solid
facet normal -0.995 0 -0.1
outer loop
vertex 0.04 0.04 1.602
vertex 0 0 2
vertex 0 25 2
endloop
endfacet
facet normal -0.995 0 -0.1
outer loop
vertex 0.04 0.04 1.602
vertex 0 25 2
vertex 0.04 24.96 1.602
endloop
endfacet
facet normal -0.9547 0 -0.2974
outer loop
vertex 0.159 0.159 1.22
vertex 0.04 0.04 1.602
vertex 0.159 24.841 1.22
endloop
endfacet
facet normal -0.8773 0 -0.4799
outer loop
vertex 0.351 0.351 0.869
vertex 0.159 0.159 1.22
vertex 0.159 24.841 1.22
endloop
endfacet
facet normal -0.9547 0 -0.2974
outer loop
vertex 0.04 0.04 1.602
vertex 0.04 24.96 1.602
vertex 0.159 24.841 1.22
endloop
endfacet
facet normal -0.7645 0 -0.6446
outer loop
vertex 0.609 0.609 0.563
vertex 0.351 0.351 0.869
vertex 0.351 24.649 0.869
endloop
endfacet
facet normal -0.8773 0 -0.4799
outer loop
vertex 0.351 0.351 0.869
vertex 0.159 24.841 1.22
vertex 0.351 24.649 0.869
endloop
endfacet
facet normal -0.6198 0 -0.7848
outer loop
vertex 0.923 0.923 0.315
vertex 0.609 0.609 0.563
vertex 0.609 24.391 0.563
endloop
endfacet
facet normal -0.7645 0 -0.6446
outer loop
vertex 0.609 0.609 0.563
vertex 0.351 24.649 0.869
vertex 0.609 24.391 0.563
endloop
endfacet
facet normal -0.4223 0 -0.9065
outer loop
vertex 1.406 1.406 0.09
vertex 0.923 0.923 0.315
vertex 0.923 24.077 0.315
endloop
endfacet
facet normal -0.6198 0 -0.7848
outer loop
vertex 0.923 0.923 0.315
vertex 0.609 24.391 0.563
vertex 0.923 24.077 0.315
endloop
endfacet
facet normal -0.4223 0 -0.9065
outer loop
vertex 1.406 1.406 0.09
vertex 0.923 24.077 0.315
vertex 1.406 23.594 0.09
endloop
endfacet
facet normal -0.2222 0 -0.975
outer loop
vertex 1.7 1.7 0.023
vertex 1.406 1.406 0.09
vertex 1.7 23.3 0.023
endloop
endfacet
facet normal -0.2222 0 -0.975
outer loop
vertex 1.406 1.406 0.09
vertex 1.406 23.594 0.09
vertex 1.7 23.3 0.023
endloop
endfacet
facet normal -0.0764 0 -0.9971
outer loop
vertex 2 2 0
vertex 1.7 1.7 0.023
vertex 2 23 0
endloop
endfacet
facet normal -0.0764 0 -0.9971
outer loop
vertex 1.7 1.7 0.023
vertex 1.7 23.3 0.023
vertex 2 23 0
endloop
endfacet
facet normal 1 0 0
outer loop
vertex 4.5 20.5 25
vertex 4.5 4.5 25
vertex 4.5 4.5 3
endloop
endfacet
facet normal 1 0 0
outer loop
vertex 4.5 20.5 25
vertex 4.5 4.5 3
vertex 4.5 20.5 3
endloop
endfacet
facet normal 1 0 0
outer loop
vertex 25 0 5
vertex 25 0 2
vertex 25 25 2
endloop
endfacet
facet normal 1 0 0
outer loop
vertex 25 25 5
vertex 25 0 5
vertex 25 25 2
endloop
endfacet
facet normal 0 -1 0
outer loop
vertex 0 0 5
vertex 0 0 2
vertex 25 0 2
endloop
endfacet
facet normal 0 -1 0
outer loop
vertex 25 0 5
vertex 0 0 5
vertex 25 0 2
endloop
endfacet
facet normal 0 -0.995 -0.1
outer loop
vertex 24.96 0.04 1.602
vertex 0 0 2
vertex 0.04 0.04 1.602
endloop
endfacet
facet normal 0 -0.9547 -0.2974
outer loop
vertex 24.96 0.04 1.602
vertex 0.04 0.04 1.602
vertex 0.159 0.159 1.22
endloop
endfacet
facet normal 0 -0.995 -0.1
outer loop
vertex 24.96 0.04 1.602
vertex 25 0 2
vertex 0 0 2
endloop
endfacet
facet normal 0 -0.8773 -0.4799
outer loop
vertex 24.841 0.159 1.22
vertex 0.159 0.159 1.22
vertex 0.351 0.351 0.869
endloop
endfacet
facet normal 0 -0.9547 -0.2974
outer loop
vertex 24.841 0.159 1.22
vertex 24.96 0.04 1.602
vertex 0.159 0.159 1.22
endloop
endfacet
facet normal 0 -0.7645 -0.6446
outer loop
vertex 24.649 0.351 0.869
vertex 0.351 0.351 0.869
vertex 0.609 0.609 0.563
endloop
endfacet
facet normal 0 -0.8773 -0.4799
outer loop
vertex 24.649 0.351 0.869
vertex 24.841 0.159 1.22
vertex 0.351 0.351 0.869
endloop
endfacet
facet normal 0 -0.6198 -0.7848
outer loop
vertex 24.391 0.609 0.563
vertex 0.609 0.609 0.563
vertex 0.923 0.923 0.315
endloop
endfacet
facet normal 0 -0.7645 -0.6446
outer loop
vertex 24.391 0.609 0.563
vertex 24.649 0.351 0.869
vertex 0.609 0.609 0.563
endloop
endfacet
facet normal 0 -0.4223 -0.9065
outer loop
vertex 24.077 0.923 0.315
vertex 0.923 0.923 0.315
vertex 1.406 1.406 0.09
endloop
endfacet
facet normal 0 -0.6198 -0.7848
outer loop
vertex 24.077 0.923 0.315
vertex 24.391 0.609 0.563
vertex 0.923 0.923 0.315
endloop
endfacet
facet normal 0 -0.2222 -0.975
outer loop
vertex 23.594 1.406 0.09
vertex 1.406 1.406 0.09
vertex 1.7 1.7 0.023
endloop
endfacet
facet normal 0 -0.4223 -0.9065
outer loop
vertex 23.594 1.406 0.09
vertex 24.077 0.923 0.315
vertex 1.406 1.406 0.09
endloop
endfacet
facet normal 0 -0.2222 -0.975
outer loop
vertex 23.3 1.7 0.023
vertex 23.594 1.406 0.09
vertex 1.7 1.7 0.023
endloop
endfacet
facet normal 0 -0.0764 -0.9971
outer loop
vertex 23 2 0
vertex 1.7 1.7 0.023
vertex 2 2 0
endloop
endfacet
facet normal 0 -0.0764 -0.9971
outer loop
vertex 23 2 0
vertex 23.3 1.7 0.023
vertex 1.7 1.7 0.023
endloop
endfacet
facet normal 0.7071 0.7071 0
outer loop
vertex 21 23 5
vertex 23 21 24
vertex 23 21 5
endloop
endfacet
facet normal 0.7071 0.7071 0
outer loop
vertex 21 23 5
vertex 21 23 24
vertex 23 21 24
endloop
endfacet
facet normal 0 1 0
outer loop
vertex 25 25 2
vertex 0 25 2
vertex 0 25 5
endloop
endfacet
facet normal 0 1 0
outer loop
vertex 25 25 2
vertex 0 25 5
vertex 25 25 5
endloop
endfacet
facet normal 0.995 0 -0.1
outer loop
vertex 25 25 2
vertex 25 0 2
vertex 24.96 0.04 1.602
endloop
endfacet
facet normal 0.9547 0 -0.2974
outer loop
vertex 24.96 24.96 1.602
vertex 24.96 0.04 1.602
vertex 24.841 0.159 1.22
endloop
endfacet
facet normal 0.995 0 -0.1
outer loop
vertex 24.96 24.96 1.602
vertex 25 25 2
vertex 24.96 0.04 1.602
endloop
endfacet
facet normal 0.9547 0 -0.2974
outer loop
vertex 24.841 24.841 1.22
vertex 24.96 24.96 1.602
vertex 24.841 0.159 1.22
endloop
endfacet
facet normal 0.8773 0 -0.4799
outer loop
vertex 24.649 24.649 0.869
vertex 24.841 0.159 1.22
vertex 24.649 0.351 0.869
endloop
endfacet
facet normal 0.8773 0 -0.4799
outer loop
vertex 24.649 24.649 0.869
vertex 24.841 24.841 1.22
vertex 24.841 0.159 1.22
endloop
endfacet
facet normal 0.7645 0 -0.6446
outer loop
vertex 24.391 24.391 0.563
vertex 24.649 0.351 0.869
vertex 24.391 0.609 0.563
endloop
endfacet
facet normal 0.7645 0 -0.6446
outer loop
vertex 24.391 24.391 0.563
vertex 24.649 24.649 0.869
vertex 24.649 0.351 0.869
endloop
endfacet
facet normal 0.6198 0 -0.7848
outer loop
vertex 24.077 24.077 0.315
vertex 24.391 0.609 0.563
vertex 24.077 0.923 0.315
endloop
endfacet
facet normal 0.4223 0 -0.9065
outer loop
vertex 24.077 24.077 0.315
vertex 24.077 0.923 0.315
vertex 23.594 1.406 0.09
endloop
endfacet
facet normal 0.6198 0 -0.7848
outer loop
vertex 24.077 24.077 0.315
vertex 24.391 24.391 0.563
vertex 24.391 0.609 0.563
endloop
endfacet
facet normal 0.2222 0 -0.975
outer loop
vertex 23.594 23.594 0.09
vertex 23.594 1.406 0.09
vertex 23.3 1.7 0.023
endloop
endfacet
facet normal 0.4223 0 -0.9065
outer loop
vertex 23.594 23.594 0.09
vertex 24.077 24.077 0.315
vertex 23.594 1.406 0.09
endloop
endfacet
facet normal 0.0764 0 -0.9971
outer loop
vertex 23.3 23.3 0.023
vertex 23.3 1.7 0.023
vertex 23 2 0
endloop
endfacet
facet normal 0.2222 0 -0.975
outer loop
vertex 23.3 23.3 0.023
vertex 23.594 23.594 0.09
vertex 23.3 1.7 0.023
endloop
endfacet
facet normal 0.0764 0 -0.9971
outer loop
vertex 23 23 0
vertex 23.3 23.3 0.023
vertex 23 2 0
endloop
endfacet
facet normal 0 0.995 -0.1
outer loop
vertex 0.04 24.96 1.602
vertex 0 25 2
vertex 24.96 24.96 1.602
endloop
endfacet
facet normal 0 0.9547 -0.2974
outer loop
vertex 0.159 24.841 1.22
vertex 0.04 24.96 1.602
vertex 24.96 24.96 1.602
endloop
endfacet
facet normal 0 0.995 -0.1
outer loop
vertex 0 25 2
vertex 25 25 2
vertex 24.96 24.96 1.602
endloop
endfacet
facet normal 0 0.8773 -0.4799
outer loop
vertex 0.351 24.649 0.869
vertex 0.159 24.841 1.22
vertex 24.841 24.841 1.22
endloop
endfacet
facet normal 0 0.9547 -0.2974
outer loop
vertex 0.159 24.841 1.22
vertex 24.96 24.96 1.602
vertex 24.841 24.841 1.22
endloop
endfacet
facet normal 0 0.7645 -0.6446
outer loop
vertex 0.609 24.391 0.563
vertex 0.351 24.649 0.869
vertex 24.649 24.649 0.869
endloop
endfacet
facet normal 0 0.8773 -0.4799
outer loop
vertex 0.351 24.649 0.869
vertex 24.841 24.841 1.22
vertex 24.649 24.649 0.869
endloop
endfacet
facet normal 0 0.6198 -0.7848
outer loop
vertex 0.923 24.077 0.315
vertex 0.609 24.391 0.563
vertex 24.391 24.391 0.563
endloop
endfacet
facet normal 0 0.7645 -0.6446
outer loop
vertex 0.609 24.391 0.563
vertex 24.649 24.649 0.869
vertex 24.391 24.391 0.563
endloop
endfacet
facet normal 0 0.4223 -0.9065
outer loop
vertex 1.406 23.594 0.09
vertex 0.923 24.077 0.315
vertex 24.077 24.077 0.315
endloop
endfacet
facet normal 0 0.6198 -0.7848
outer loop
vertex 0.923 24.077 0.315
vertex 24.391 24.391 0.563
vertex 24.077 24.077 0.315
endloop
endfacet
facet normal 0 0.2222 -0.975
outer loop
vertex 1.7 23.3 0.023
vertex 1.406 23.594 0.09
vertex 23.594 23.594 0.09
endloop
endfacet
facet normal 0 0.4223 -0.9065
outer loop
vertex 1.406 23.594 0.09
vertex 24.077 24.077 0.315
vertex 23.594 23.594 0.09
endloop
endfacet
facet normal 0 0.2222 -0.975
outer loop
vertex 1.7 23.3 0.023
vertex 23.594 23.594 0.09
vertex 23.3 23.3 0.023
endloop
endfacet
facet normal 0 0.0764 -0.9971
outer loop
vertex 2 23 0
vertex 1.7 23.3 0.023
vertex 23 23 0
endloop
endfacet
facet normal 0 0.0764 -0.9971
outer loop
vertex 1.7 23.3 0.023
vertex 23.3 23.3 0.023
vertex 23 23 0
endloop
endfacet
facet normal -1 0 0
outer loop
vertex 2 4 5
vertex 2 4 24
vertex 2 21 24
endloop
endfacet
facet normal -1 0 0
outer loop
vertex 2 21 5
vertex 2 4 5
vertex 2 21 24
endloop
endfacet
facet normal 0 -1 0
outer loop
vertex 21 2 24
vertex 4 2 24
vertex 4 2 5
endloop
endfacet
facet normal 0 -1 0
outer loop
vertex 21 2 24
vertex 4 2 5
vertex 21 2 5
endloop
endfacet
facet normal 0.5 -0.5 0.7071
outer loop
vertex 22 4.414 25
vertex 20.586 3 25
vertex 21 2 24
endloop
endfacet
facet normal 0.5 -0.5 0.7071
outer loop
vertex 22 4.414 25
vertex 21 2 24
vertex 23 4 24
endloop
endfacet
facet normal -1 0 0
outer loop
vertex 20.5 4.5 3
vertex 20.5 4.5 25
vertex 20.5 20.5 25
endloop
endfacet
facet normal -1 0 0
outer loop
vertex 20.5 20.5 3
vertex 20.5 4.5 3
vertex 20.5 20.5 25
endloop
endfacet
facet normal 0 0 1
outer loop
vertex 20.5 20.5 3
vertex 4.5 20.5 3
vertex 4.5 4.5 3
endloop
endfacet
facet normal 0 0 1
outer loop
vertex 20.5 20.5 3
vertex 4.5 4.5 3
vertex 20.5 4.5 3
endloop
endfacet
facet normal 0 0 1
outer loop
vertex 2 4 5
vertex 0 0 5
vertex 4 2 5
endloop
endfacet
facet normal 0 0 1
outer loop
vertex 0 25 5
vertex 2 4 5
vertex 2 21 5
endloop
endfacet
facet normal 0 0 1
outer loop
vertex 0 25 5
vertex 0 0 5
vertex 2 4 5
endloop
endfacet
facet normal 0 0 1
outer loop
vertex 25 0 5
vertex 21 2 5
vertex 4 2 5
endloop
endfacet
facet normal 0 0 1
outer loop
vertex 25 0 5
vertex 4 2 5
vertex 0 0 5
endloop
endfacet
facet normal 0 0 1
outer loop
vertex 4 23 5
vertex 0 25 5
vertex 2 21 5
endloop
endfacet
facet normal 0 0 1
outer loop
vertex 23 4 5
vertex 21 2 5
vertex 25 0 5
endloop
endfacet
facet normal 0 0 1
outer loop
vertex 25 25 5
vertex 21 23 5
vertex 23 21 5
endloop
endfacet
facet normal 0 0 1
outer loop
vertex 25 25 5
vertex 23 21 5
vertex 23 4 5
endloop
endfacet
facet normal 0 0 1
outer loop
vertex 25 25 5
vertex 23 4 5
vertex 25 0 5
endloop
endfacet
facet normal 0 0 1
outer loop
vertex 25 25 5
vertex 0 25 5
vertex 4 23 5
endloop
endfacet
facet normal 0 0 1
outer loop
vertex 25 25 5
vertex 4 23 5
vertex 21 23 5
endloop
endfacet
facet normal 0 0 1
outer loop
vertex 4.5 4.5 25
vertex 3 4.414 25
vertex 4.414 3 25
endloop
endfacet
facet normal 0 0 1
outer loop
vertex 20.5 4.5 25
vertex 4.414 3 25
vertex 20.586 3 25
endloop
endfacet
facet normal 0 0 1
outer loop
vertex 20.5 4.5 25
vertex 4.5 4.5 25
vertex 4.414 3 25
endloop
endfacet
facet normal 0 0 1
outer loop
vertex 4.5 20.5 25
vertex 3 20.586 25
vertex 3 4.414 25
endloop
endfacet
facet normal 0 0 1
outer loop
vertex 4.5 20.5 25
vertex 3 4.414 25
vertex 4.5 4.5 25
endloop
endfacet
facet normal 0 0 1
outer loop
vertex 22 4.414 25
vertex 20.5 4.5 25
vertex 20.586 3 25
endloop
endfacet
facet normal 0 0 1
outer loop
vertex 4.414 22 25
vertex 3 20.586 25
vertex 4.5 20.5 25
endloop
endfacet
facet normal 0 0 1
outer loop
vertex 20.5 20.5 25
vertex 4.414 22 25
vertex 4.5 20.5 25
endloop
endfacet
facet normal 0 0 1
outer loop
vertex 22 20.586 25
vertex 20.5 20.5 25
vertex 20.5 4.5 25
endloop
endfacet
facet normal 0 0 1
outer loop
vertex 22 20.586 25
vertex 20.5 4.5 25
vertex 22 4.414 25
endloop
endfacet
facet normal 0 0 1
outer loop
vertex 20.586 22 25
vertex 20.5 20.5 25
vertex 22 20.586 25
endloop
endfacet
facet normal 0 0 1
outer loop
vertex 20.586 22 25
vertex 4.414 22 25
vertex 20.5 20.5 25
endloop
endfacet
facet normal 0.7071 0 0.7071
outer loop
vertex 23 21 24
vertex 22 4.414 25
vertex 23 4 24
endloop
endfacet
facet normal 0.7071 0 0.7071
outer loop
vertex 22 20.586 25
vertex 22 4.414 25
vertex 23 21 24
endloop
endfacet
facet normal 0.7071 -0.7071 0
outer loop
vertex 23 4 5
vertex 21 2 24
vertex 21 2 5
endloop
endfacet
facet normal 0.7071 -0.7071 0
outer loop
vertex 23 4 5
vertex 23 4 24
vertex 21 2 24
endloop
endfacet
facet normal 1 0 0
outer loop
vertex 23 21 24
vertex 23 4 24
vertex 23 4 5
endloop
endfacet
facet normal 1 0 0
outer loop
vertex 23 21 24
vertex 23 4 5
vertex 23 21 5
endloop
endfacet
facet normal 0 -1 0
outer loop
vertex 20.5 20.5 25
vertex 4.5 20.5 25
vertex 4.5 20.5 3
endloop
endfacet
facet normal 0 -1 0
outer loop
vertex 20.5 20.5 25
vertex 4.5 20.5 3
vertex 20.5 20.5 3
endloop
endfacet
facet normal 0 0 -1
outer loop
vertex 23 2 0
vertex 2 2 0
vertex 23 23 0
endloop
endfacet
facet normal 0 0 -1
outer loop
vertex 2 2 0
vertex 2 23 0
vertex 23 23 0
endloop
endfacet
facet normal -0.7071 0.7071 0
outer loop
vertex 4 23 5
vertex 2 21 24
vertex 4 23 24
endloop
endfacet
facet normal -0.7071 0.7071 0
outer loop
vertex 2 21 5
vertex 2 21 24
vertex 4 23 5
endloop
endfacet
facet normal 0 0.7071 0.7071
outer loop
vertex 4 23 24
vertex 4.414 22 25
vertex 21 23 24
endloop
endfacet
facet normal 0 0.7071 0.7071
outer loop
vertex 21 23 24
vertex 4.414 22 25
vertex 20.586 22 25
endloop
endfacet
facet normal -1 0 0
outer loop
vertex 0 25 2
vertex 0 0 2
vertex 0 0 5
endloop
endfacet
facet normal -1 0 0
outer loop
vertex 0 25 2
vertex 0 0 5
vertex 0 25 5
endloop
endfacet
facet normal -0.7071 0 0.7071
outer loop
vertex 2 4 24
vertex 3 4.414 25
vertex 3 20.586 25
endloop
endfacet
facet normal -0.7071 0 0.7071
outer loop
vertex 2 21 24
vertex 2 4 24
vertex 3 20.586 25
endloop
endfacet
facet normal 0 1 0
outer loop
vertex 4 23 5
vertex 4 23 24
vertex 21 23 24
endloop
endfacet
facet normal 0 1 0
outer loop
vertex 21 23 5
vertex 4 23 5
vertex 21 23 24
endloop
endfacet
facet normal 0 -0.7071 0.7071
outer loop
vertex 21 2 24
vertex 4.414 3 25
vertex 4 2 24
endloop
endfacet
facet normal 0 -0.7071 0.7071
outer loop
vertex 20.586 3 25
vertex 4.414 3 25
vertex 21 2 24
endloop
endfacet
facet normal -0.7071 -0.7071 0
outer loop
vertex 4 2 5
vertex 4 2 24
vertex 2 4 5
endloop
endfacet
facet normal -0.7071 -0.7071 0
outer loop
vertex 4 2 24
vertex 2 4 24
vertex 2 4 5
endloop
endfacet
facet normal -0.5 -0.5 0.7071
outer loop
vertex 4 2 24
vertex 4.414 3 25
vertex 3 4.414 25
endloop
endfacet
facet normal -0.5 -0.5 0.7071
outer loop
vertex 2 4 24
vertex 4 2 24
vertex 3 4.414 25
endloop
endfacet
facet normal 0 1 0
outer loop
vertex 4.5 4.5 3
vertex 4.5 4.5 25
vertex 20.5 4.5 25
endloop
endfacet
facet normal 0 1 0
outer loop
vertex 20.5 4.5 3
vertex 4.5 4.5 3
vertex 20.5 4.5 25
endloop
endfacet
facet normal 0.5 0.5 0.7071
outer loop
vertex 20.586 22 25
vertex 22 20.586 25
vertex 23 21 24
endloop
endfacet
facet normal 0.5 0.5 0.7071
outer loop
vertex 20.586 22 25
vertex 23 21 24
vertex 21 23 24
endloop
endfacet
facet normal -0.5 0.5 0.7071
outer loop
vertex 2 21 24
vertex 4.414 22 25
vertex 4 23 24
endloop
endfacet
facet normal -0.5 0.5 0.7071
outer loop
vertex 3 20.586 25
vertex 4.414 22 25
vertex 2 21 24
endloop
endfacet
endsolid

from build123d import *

# Parameters (mm, degrees)
SKETCH_W        = 25
SKETCH_H        = 25
PAD_DEPTH       = 25
SKETCH001_W     = 25
SKETCH001_H     = 25
SKETCH001_W_2   = 21
SKETCH001_H_2   = 21
POCKET_DEPTH    = 20
SKETCH002_W     = 16
SKETCH002_H     = 16
POCKET001_DEPTH = 22
CHAMFER_SIZE    = 2
FILLET_R        = 2
CHAMFER001_SIZE = 1


with BuildPart() as part:
    # Sketch → Pad (new body)
    with BuildSketch(Plane.XY):
        with Locations((12.5, 12.5)):
            Rectangle(SKETCH_W, SKETCH_H)
    extrude(amount=PAD_DEPTH)

    # Sketch001 (on Face6 of Pad) → Pocket (cut)
    with BuildSketch(Plane.XY.offset(25)):
        with Locations((12.5, 12.5)):
            Rectangle(SKETCH001_W, SKETCH001_H)
        with Locations((12.5, 12.5)):
            Rectangle(SKETCH001_W_2, SKETCH001_H_2, mode=Mode.SUBTRACT)
    extrude(amount=-POCKET_DEPTH, mode=Mode.SUBTRACT)

    # Sketch002 (on Face11 of Pocket) → Pocket001 (cut)
    with BuildSketch(Plane.XY.offset(25)):
        with Locations((12.5, 12.5)):
            Rectangle(SKETCH002_W, SKETCH002_H)
    extrude(amount=-POCKET001_DEPTH, mode=Mode.SUBTRACT)

    # Chamfer
    chamfer_edges = [part.edges().sort_by_distance(p)[0] for p in [
        (2, 2, 15),
        (23, 2, 15),
        (2, 23, 15),
        (23, 23, 15),
    ]]
    chamfer(chamfer_edges, length=CHAMFER_SIZE)

    # Fillet
    fillet_edges = [part.edges().sort_by_distance(p)[0] for p in [
        (12.5, 0, 0),
        (25, 12.5, 0),
        (12.5, 25, 0),
        (0, 12.5, 0),
    ]]
    fillet(fillet_edges, radius=FILLET_R)

    # Chamfer001
    chamfer001_edges = [part.edges().sort_by_distance(p)[0] for p in [
        (23, 12.5, 25),
        (22, 3, 25),
        (12.5, 2, 25),
        (3, 3, 25),
        (2, 12.5, 25),
        (3, 22, 25),
        (12.5, 23, 25),
        (22, 22, 25),
    ]]
    chamfer(chamfer001_edges, length=CHAMFER001_SIZE)


solid = part.part
